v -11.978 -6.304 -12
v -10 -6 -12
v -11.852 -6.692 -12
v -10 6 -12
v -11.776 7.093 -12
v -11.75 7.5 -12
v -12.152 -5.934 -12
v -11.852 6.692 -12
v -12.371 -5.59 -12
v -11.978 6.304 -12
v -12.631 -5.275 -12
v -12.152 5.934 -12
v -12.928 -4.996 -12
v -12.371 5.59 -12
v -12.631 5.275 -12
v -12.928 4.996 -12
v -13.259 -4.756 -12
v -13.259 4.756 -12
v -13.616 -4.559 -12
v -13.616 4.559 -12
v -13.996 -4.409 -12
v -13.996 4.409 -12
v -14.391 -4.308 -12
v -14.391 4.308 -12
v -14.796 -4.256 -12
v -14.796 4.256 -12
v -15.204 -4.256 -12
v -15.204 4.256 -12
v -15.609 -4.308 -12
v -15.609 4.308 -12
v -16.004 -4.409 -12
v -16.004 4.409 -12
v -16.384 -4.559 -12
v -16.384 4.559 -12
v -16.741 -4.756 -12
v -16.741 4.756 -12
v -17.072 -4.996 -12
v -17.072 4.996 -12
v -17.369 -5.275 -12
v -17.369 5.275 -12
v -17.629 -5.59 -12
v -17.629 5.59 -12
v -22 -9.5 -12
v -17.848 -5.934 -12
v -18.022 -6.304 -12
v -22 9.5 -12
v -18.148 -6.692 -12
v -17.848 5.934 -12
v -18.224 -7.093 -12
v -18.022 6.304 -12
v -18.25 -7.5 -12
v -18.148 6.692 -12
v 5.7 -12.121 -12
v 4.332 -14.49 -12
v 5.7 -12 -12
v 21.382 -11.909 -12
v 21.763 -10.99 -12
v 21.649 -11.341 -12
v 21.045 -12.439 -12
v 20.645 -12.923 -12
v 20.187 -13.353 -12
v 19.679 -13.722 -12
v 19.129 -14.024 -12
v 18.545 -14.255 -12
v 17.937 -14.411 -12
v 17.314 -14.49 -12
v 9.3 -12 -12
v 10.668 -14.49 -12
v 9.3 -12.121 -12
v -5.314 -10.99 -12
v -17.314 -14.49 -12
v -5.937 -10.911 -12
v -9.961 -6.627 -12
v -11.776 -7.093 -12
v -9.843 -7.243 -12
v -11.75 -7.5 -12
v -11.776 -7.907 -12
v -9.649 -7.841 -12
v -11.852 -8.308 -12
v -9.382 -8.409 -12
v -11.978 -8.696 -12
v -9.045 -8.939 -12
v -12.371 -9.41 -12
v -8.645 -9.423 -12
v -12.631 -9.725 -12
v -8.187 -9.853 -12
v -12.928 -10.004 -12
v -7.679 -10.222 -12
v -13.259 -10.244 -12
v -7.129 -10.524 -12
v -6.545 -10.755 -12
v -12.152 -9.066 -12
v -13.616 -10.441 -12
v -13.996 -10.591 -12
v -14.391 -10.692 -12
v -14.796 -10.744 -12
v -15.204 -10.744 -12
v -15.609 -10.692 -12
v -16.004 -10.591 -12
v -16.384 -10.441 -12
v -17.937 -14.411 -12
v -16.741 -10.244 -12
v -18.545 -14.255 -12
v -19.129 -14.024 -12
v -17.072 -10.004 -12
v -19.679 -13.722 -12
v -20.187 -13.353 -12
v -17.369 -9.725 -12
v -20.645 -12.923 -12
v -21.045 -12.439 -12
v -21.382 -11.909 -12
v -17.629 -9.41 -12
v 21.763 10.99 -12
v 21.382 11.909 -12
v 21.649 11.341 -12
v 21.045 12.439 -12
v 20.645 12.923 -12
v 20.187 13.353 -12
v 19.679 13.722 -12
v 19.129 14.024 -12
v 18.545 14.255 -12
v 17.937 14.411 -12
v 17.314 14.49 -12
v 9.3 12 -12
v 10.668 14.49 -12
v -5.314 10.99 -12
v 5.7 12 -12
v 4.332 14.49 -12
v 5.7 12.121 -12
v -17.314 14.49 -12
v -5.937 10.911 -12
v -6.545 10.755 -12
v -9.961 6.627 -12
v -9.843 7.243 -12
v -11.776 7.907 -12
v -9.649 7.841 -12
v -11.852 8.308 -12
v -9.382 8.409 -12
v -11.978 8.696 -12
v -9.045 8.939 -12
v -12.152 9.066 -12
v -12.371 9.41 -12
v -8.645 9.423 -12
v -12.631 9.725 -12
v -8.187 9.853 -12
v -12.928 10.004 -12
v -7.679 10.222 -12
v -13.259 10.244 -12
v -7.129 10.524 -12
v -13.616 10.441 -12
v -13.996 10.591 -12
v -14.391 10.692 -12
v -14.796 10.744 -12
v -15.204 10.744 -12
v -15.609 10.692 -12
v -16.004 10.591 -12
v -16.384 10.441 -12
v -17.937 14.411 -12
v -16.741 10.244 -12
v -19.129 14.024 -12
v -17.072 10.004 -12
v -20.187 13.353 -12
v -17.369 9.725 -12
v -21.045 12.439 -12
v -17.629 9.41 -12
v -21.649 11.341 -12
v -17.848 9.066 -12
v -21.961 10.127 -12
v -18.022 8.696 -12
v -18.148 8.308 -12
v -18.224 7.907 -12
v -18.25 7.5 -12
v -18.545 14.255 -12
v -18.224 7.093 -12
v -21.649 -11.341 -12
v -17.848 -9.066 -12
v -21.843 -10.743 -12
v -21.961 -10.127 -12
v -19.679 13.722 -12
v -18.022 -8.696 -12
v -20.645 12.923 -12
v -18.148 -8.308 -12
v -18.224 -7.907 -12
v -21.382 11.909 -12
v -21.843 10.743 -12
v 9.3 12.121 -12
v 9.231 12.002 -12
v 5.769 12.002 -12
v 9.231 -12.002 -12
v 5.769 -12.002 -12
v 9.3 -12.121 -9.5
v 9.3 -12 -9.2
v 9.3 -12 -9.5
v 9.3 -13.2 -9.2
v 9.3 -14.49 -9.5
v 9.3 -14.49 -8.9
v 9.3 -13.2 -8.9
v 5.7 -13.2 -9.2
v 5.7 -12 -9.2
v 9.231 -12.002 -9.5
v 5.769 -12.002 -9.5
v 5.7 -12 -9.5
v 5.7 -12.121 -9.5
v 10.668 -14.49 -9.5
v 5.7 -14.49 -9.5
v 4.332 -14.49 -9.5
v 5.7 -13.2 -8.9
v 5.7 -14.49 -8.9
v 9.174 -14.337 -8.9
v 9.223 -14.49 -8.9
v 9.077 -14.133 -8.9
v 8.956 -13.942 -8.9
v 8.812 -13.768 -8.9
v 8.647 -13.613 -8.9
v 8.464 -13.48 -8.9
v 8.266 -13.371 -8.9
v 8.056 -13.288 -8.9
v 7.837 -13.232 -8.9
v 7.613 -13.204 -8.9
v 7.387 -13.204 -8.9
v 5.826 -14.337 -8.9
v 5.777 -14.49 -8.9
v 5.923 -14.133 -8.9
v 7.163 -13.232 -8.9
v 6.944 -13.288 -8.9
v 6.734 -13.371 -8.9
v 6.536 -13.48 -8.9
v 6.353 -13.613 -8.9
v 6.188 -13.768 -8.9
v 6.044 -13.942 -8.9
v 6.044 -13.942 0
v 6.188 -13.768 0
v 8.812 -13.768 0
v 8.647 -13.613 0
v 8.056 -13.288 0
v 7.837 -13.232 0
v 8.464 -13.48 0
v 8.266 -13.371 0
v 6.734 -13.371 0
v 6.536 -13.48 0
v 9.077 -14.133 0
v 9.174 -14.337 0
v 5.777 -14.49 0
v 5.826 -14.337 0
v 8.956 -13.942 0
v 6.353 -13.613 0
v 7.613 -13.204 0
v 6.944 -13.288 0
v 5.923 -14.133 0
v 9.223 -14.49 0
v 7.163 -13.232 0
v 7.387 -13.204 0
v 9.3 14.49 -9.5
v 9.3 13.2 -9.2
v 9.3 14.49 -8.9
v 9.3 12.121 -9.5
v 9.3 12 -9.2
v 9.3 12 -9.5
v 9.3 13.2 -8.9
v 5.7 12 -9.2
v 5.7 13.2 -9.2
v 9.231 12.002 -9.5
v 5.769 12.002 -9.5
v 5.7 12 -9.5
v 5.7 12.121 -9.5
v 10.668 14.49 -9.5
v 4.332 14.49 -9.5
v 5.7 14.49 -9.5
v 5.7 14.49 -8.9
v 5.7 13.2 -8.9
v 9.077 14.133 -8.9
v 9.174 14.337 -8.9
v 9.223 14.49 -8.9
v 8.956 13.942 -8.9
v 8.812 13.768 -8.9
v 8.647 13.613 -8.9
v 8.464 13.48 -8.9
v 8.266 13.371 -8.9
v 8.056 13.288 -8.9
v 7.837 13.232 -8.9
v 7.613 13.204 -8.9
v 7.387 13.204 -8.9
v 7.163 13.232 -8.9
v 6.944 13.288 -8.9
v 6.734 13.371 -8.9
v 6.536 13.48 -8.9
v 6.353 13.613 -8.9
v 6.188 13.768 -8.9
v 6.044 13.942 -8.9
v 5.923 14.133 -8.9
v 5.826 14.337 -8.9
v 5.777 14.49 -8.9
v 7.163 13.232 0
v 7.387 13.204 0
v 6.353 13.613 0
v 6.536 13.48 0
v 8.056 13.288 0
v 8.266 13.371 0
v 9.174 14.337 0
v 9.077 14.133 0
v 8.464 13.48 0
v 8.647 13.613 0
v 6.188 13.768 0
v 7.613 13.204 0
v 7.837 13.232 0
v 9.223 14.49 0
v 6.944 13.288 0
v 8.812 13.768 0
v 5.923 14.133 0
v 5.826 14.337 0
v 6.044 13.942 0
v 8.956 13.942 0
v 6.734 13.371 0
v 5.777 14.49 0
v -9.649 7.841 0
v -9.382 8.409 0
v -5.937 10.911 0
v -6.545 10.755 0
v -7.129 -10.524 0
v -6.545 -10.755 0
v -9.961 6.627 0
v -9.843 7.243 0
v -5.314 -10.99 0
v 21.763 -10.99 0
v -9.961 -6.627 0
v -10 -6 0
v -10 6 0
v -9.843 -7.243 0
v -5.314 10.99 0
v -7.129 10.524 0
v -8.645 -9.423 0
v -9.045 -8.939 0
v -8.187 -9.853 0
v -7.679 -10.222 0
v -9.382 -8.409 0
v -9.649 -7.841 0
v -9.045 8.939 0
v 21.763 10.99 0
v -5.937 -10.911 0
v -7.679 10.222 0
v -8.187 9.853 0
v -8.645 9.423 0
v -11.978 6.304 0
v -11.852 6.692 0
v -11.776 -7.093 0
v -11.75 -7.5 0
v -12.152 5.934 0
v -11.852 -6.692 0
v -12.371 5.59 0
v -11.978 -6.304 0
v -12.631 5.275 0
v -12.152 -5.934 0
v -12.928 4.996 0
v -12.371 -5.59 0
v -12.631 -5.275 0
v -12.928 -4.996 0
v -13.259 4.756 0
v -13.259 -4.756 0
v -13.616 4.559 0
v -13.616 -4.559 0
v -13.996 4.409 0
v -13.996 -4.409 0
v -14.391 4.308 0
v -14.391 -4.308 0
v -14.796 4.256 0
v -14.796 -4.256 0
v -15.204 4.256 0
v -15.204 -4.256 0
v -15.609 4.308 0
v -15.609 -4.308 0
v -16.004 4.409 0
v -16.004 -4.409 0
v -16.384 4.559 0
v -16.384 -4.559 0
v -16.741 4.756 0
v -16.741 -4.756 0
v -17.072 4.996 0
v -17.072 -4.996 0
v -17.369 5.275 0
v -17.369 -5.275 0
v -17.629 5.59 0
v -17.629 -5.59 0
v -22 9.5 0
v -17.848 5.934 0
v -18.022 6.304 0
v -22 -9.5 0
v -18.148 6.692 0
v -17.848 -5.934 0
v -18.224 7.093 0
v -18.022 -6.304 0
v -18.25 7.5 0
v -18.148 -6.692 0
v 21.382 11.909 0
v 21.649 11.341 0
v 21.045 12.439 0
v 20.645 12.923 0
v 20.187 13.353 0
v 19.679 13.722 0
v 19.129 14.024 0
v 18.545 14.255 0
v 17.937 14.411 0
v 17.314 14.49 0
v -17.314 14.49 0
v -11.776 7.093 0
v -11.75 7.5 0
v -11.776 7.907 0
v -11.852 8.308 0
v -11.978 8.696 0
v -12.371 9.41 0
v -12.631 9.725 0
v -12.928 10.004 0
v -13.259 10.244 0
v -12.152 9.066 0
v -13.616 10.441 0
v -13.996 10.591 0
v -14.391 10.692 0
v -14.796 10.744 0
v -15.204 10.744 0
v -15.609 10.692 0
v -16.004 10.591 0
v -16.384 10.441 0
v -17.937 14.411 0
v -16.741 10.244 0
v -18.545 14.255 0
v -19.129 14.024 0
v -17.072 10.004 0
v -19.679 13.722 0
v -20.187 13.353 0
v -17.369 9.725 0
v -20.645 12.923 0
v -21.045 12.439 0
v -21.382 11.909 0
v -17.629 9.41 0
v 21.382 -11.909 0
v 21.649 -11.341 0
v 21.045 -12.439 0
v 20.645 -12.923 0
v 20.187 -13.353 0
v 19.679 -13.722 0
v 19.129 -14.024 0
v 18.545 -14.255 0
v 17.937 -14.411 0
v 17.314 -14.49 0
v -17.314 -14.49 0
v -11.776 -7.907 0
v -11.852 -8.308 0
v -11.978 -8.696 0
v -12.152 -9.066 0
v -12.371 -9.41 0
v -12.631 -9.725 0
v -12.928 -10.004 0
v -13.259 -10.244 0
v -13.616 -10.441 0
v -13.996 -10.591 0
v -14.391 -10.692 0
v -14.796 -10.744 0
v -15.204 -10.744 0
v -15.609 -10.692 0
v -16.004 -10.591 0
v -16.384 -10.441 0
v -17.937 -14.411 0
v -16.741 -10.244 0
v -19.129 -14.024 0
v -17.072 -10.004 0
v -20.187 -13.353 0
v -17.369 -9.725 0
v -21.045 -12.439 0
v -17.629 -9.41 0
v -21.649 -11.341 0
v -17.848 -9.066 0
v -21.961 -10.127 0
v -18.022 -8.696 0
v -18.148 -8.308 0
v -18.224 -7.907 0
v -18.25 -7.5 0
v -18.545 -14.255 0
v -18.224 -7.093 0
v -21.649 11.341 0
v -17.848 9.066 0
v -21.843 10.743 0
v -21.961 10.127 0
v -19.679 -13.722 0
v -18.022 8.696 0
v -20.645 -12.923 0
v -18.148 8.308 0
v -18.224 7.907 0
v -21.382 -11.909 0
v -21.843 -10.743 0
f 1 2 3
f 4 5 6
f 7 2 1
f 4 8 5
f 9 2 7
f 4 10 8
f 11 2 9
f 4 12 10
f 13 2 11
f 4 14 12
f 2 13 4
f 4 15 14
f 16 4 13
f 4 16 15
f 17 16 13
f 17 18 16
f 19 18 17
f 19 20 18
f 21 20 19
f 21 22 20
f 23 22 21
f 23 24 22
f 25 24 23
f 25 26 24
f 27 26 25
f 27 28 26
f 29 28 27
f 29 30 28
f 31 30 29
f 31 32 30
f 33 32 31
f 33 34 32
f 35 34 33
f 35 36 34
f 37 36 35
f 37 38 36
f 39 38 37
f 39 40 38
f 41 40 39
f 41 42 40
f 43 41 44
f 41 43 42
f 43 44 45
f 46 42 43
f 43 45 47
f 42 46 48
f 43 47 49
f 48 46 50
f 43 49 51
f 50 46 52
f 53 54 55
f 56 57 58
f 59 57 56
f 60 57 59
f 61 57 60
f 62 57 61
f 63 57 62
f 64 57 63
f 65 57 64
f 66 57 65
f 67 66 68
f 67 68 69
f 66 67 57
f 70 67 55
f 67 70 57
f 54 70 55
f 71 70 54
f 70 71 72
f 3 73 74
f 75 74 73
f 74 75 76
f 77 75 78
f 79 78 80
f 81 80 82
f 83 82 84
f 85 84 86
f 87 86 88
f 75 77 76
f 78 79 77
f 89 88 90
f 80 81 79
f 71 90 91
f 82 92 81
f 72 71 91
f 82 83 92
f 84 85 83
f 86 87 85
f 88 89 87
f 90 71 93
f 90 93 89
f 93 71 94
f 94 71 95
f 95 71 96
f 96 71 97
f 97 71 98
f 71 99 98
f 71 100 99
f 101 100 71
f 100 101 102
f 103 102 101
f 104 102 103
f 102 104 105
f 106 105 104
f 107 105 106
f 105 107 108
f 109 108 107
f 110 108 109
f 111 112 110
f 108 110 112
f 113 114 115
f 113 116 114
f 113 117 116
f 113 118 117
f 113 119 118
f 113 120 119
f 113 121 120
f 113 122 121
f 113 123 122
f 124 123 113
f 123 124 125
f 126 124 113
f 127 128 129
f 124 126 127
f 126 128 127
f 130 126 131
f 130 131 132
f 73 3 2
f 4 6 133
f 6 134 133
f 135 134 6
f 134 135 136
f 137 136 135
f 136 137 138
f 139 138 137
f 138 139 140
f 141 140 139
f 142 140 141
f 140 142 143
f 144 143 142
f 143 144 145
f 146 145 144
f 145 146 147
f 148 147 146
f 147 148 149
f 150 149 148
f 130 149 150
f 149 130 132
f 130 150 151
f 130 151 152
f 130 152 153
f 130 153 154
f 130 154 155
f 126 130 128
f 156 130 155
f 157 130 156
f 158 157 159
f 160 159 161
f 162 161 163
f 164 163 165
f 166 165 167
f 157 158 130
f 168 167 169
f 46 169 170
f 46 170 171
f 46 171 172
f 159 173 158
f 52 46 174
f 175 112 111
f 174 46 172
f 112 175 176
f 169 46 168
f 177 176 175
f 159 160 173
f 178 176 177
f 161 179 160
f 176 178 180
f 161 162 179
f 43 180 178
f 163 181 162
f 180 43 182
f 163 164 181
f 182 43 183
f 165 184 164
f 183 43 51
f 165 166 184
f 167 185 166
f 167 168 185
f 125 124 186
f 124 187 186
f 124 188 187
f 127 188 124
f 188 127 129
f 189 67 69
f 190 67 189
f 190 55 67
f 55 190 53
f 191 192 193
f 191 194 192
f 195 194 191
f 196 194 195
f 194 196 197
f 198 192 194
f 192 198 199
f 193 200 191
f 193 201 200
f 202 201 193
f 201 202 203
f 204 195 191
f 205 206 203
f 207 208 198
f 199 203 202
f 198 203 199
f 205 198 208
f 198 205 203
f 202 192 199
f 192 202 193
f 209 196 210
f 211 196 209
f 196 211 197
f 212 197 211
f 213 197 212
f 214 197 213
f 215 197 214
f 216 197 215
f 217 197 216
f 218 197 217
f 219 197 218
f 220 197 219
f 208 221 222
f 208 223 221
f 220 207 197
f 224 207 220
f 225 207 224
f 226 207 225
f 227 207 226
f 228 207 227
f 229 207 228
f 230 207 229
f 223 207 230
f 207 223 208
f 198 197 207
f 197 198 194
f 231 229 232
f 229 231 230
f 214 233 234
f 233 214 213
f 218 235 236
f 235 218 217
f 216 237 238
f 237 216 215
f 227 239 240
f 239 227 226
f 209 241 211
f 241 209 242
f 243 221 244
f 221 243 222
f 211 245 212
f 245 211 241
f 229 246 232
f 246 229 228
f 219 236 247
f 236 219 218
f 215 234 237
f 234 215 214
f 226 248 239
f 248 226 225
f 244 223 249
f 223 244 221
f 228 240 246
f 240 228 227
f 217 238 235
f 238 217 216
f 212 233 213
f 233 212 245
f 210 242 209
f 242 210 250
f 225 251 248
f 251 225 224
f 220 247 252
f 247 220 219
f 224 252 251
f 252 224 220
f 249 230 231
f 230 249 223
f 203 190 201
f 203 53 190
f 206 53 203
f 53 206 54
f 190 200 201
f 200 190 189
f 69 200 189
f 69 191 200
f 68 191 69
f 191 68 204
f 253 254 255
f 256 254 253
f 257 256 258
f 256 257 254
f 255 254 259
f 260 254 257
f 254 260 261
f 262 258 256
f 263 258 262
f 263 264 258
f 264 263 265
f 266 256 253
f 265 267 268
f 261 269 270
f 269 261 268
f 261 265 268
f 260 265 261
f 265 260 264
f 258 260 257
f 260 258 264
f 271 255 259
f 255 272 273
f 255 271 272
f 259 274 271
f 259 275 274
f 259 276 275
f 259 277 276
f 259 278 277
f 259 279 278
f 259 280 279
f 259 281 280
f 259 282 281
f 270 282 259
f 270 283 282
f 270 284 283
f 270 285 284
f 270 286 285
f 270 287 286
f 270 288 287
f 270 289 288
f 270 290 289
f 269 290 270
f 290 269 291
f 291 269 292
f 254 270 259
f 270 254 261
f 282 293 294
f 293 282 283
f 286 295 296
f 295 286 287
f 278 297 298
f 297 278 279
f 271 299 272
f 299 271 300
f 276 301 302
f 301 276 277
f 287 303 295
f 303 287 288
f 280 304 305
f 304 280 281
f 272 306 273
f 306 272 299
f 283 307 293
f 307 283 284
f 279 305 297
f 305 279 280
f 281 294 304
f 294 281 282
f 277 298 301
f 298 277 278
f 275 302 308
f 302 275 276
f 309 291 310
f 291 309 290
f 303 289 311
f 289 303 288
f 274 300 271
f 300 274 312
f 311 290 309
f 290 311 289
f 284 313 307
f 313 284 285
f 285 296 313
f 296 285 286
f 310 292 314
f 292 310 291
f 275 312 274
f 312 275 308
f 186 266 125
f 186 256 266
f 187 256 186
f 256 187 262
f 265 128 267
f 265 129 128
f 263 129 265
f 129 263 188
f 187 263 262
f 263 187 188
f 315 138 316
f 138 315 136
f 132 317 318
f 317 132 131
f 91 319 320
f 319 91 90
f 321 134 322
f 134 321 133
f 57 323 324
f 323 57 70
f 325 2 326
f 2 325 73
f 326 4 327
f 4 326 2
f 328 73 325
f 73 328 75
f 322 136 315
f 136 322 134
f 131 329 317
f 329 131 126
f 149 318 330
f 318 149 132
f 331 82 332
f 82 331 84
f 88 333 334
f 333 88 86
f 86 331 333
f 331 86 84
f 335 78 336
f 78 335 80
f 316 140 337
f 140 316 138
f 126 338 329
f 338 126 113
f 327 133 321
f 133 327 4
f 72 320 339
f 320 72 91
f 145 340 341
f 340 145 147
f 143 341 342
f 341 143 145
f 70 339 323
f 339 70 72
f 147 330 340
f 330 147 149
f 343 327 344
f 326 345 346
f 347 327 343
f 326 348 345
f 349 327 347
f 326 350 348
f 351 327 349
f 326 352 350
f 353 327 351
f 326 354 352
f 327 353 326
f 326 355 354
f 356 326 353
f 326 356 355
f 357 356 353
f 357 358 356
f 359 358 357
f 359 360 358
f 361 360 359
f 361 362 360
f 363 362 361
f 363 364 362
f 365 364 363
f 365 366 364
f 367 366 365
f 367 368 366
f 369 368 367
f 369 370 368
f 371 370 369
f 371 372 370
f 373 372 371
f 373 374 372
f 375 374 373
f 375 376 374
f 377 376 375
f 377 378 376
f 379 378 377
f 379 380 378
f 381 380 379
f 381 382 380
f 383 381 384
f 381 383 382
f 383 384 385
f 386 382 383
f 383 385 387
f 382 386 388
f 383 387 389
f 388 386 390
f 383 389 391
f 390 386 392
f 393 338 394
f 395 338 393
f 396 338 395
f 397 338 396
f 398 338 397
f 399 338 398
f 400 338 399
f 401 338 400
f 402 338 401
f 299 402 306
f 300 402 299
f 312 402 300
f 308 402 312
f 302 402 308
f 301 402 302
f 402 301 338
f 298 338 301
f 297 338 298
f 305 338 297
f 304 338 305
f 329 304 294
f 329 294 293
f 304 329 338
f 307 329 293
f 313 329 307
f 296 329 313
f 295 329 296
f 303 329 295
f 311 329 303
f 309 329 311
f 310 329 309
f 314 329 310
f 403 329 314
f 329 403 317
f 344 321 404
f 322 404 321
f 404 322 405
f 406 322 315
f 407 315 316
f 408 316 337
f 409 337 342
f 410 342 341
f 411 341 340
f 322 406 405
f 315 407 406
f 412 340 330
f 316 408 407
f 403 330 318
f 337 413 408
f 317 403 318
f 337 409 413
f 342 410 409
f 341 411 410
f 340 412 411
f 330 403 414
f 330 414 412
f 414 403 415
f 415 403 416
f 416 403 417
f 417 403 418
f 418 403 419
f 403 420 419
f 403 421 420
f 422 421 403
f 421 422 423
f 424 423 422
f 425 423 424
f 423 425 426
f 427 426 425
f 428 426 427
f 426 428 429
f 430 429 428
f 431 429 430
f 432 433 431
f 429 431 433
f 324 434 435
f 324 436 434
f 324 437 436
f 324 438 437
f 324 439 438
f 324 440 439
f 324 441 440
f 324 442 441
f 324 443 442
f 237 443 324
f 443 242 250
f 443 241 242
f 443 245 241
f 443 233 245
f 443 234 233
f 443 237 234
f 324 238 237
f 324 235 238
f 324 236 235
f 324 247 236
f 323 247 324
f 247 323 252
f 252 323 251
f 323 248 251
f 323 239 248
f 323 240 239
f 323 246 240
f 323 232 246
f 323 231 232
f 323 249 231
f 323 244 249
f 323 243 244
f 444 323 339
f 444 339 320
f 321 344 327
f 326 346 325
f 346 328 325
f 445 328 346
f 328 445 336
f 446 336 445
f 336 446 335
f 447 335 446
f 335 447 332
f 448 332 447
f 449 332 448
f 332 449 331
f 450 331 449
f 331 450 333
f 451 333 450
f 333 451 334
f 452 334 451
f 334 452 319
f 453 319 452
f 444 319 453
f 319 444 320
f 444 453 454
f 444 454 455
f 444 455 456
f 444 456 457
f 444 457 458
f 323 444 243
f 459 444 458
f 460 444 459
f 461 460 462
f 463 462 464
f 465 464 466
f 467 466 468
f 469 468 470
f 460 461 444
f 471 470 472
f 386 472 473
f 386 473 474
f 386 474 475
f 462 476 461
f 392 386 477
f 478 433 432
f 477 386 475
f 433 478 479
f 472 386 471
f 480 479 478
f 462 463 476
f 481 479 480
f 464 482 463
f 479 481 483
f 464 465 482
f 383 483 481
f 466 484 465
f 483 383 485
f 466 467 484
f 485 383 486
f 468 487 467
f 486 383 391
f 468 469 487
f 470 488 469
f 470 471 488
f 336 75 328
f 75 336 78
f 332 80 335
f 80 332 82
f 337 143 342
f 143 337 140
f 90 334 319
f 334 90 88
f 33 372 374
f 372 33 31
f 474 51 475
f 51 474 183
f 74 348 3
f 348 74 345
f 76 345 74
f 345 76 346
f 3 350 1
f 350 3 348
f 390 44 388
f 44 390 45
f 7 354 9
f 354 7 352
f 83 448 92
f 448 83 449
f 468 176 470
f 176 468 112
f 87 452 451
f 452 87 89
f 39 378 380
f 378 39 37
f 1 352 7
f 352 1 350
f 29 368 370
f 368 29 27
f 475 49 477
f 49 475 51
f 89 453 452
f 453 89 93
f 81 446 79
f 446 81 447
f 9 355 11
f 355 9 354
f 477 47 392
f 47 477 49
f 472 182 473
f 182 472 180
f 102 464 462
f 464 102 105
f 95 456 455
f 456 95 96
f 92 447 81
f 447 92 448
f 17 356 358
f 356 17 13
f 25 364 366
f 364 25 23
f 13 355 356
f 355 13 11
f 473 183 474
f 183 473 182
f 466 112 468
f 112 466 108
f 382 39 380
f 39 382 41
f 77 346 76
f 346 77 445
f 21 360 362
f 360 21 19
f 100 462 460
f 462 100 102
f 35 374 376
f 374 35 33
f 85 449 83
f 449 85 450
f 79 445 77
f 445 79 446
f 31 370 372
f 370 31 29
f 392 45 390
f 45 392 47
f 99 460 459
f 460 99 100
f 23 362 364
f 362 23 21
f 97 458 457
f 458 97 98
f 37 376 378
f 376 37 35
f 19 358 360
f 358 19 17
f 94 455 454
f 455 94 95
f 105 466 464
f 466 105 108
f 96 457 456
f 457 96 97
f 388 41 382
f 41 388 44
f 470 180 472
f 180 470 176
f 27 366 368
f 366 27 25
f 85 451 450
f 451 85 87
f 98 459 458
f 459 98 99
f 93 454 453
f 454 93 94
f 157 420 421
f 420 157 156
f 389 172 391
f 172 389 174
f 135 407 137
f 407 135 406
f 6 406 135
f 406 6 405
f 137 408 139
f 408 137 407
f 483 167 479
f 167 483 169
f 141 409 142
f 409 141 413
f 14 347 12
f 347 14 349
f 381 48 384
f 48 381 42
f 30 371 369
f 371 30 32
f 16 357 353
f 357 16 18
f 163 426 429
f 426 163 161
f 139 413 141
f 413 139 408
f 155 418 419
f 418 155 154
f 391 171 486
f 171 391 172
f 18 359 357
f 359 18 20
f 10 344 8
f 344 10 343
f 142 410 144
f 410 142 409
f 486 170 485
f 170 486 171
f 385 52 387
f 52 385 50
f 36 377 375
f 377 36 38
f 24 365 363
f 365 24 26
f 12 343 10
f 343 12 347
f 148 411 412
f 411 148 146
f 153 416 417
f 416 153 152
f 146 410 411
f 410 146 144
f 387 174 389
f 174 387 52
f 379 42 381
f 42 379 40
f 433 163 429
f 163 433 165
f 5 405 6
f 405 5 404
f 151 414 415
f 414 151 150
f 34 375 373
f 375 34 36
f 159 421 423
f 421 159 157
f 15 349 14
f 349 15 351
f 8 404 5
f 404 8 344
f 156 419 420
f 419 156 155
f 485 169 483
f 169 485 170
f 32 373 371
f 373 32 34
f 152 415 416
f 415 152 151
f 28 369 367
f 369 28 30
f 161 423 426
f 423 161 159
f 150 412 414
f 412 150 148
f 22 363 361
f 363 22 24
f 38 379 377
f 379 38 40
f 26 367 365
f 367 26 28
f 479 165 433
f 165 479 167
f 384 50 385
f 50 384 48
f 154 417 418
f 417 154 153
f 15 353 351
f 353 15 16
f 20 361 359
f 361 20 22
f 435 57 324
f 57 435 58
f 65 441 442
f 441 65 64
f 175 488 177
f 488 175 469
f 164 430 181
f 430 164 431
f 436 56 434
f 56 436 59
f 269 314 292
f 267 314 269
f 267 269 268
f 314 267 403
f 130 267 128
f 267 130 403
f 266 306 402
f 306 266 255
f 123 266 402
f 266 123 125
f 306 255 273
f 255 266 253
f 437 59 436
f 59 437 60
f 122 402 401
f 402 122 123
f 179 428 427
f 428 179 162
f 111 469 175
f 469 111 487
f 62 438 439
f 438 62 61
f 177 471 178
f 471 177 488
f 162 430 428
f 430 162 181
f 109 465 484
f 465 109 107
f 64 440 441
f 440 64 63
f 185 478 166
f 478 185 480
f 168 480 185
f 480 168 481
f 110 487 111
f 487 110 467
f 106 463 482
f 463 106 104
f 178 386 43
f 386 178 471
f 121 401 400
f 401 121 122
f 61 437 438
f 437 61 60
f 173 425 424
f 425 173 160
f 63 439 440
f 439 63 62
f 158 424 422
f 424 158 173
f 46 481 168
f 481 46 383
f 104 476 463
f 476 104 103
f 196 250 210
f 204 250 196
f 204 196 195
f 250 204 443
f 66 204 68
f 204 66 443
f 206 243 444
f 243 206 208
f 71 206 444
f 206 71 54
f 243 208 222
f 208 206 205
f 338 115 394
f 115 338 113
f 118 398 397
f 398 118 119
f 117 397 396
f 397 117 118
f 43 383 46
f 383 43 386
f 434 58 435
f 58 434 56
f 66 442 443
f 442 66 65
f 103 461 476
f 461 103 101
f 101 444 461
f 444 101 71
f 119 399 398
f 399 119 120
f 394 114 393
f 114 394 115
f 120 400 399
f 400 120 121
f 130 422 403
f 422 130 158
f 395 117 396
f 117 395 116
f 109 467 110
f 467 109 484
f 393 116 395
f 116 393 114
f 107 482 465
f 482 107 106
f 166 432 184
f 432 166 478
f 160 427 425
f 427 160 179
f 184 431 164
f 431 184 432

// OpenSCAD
$fn = 50;


difference() {
	union() {
		*color(alpha = 1.0000000000, c = "gray") {
			translate(v = [0, 14, -12]) {
				linear_extrude(height = 2) {
					text(font = "Arial:style=Bold", halign = "center", size = 4.5000000000, text = "COMMENT description oobb_plate_shape_positive_type_12_depth_0_0_-12_pos_spacer_u_extra_12_thickness_3_width_2_height_0_0_-12_pos_plate", valign = "center");
				}
			}
		}
		translate(v = [0, 0, -12]) {
			hull() {
				translate(v = [-17.0000000000, 9.5000000000, 0]) {
					cylinder(h = 12, r = 5);
				}
				translate(v = [17.0000000000, 9.5000000000, 0]) {
					cylinder(h = 12, r = 5);
				}
				translate(v = [-17.0000000000, -9.5000000000, 0]) {
					cylinder(h = 12, r = 5);
				}
				translate(v = [17.0000000000, -9.5000000000, 0]) {
					cylinder(h = 12, r = 5);
				}
			}
		}
		*color(alpha = 1.0000000000, c = "gray") {
			translate(v = [0, 14, -12]) {
				linear_extrude(height = 2) {
					text(font = "Arial:style=Bold", halign = "center", size = 4.5000000000, text = "COMMENT description oobb_holes_shape_p_type_0_0_-12_pos_spacer_u_extra_12_thickness_3_width_2_height_0_0_-12_pos_plate_'left'_'right'_'top'_hole_sides_'left'_'right'_'top'_holes_true_both_holes", valign = "center");
				}
			}
		}
		*color(alpha = 1.0000000000, c = "gray") {
			translate(v = [0, 14, -3]) {
				rotate(a = [0, 0, 180]) {
					linear_extrude(height = 2) {
						text(font = "Arial:style=Bold", halign = "center", size = 4.5000000000, text = "COMMENT description oobb_wire_spacer_u_shape_0_0_-3_pos_spacer_u_extra_12_thickness_3_width_2_height_0_0_-12_pos_plate_0_0_180_rot", valign = "center");
					}
				}
			}
		}
	}
	union() {
		translate(v = [7.5000000000, -15, -12]) {
			rotate(a = [0, 0, 0]) {
				difference() {
					union() {
						#translate(v = [-1.8000000000, -3.0000000000, -0.3000000000]) {
							cube(size = [3.6000000000, 6.0000000000, 0.3000000000]);
						}
						#translate(v = [-1.8000000000, -1.8000000000, -0.6000000000]) {
							cube(size = [3.6000000000, 3.6000000000, 0.3000000000]);
						}
						#translate(v = [-1.8000000000, -3.0000000000, 2.5000000000]) {
							cube(size = [3.6000000000, 6.0000000000, 0.3000000000]);
						}
						#translate(v = [-1.8000000000, -1.8000000000, 2.8000000000]) {
							cube(size = [3.6000000000, 3.6000000000, 0.3000000000]);
						}
						#translate(v = [0, 0, -50.0000000000]) {
							cylinder(h = 100, r = 1.8000000000);
						}
						#linear_extrude(height = 2.5000000000) {
							polygon(points = [[3.4620000000, 0.0000000000], [1.7310000000, 2.9981799479], [-1.7310000000, 2.9981799479], [-3.4620000000, 0.0000000000], [-1.7310000000, -2.9981799479], [1.7310000000, -2.9981799479]]);
						}
						#translate(v = [-1.8000000000, -3.0000000000, -0.3000000000]) {
							cube(size = [3.6000000000, 6.0000000000, 0.3000000000]);
						}
						#translate(v = [-1.8000000000, -1.8000000000, -0.6000000000]) {
							cube(size = [3.6000000000, 3.6000000000, 0.3000000000]);
						}
						#translate(v = [-1.8000000000, -3.0000000000, 2.5000000000]) {
							cube(size = [3.6000000000, 6.0000000000, 0.3000000000]);
						}
						#translate(v = [-1.8000000000, -1.8000000000, 2.8000000000]) {
							cube(size = [3.6000000000, 3.6000000000, 0.3000000000]);
						}
						#translate(v = [0, 0, -50.0000000000]) {
							cylinder(h = 100, r = 1.8000000000);
						}
						#translate(v = [-1.8000000000, -3.0000000000, -0.3000000000]) {
							cube(size = [3.6000000000, 6.0000000000, 0.3000000000]);
						}
						#translate(v = [-1.8000000000, -1.8000000000, -0.6000000000]) {
							cube(size = [3.6000000000, 3.6000000000, 0.3000000000]);
						}
						#translate(v = [-1.8000000000, -3.0000000000, 2.5000000000]) {
							cube(size = [3.6000000000, 6.0000000000, 0.3000000000]);
						}
						#translate(v = [-1.8000000000, -1.8000000000, 2.8000000000]) {
							cube(size = [3.6000000000, 3.6000000000, 0.3000000000]);
						}
						#translate(v = [0, 0, -50.0000000000]) {
							cylinder(h = 100, r = 1.8000000000);
						}
					}
					union();
				}
			}
		}
		translate(v = [7.5000000000, 15, -12]) {
			rotate(a = [0, 0, 0]) {
				difference() {
					union() {
						#translate(v = [-1.8000000000, -3.0000000000, -0.3000000000]) {
							cube(size = [3.6000000000, 6.0000000000, 0.3000000000]);
						}
						#translate(v = [-1.8000000000, -1.8000000000, -0.6000000000]) {
							cube(size = [3.6000000000, 3.6000000000, 0.3000000000]);
						}
						#translate(v = [-1.8000000000, -3.0000000000, 2.5000000000]) {
							cube(size = [3.6000000000, 6.0000000000, 0.3000000000]);
						}
						#translate(v = [-1.8000000000, -1.8000000000, 2.8000000000]) {
							cube(size = [3.6000000000, 3.6000000000, 0.3000000000]);
						}
						#translate(v = [0, 0, -50.0000000000]) {
							cylinder(h = 100, r = 1.8000000000);
						}
						#linear_extrude(height = 2.5000000000) {
							polygon(points = [[3.4620000000, 0.0000000000], [1.7310000000, 2.9981799479], [-1.7310000000, 2.9981799479], [-3.4620000000, 0.0000000000], [-1.7310000000, -2.9981799479], [1.7310000000, -2.9981799479]]);
						}
						#translate(v = [-1.8000000000, -3.0000000000, -0.3000000000]) {
							cube(size = [3.6000000000, 6.0000000000, 0.3000000000]);
						}
						#translate(v = [-1.8000000000, -1.8000000000, -0.6000000000]) {
							cube(size = [3.6000000000, 3.6000000000, 0.3000000000]);
						}
						#translate(v = [-1.8000000000, -3.0000000000, 2.5000000000]) {
							cube(size = [3.6000000000, 6.0000000000, 0.3000000000]);
						}
						#translate(v = [-1.8000000000, -1.8000000000, 2.8000000000]) {
							cube(size = [3.6000000000, 3.6000000000, 0.3000000000]);
						}
						#translate(v = [0, 0, -50.0000000000]) {
							cylinder(h = 100, r = 1.8000000000);
						}
						#translate(v = [-1.8000000000, -3.0000000000, -0.3000000000]) {
							cube(size = [3.6000000000, 6.0000000000, 0.3000000000]);
						}
						#translate(v = [-1.8000000000, -1.8000000000, -0.6000000000]) {
							cube(size = [3.6000000000, 3.6000000000, 0.3000000000]);
						}
						#translate(v = [-1.8000000000, -3.0000000000, 2.5000000000]) {
							cube(size = [3.6000000000, 6.0000000000, 0.3000000000]);
						}
						#translate(v = [-1.8000000000, -1.8000000000, 2.8000000000]) {
							cube(size = [3.6000000000, 3.6000000000, 0.3000000000]);
						}
						#translate(v = [0, 0, -50.0000000000]) {
							cylinder(h = 100, r = 1.8000000000);
						}
					}
					union();
				}
			}
		}
		translate(v = [0, 0, -3]) {
			rotate(a = [0, 0, 180]) {
				difference() {
					union() {
						translate(v = [-10, 0, -9]) {
							hull() {
								translate(v = [-15.0000000000, 6.0000000000, 0]) {
									cylinder(h = 12, r = 5);
								}
								translate(v = [15.0000000000, 6.0000000000, 0]) {
									cylinder(h = 12, r = 5);
								}
								translate(v = [-15.0000000000, -6.0000000000, 0]) {
									cylinder(h = 12, r = 5);
								}
								translate(v = [15.0000000000, -6.0000000000, 0]) {
									cylinder(h = 12, r = 5);
								}
							}
						}
					}
					union();
				}
			}
		}
		translate(v = [-15.0000000000, -7.5000000000, -50.0000000000]) {
			cylinder(h = 100, r = 3.2500000000);
		}
		translate(v = [-15.0000000000, 7.5000000000, -50.0000000000]) {
			cylinder(h = 100, r = 3.2500000000);
		}
		translate(v = [-15.0000000000, 7.5000000000, -50.0000000000]) {
			cylinder(h = 100, r = 3.2500000000);
		}
		translate(v = [0.0000000000, 7.5000000000, -50.0000000000]) {
			cylinder(h = 100, r = 3.2500000000);
		}
		translate(v = [15.0000000000, 7.5000000000, -50.0000000000]) {
			cylinder(h = 100, r = 3.2500000000);
		}
		translate(v = [-15.0000000000, -7.5000000000, -50.0000000000]) {
			cylinder(h = 100, r = 3.2500000000);
		}
		translate(v = [0.0000000000, -7.5000000000, -50.0000000000]) {
			cylinder(h = 100, r = 3.2500000000);
		}
		translate(v = [15.0000000000, -7.5000000000, -50.0000000000]) {
			cylinder(h = 100, r = 3.2500000000);
		}
		*color(alpha = 1.0000000000, c = "gray") {
			translate(v = [7.5000000000, -1, -12]) {
				linear_extrude(height = 2) {
					text(font = "Arial:style=Bold", halign = "center", size = 4.5000000000, text = "COMMENT description oobb_nut_shape_negative_type_m3_radius_name_7.5_-15_-12_pos_12_thickness_3_width_2_height_0_0_-12_pos_plate_bottom_zz_true_overhang_0_0_0_rot_false_nut_true_hole", valign = "center");
				}
			}
		}
		*color(alpha = 1.0000000000, c = "gray") {
			translate(v = [7.5000000000, 29, -12]) {
				linear_extrude(height = 2) {
					text(font = "Arial:style=Bold", halign = "center", size = 4.5000000000, text = "COMMENT description oobb_nut_shape_negative_type_m3_radius_name_7.5_15_-12_pos_12_thickness_3_width_2_height_0_0_-12_pos_plate_bottom_zz_true_overhang_0_0_0_rot_false_nut_true_hole", valign = "center");
				}
			}
		}
	}
}
